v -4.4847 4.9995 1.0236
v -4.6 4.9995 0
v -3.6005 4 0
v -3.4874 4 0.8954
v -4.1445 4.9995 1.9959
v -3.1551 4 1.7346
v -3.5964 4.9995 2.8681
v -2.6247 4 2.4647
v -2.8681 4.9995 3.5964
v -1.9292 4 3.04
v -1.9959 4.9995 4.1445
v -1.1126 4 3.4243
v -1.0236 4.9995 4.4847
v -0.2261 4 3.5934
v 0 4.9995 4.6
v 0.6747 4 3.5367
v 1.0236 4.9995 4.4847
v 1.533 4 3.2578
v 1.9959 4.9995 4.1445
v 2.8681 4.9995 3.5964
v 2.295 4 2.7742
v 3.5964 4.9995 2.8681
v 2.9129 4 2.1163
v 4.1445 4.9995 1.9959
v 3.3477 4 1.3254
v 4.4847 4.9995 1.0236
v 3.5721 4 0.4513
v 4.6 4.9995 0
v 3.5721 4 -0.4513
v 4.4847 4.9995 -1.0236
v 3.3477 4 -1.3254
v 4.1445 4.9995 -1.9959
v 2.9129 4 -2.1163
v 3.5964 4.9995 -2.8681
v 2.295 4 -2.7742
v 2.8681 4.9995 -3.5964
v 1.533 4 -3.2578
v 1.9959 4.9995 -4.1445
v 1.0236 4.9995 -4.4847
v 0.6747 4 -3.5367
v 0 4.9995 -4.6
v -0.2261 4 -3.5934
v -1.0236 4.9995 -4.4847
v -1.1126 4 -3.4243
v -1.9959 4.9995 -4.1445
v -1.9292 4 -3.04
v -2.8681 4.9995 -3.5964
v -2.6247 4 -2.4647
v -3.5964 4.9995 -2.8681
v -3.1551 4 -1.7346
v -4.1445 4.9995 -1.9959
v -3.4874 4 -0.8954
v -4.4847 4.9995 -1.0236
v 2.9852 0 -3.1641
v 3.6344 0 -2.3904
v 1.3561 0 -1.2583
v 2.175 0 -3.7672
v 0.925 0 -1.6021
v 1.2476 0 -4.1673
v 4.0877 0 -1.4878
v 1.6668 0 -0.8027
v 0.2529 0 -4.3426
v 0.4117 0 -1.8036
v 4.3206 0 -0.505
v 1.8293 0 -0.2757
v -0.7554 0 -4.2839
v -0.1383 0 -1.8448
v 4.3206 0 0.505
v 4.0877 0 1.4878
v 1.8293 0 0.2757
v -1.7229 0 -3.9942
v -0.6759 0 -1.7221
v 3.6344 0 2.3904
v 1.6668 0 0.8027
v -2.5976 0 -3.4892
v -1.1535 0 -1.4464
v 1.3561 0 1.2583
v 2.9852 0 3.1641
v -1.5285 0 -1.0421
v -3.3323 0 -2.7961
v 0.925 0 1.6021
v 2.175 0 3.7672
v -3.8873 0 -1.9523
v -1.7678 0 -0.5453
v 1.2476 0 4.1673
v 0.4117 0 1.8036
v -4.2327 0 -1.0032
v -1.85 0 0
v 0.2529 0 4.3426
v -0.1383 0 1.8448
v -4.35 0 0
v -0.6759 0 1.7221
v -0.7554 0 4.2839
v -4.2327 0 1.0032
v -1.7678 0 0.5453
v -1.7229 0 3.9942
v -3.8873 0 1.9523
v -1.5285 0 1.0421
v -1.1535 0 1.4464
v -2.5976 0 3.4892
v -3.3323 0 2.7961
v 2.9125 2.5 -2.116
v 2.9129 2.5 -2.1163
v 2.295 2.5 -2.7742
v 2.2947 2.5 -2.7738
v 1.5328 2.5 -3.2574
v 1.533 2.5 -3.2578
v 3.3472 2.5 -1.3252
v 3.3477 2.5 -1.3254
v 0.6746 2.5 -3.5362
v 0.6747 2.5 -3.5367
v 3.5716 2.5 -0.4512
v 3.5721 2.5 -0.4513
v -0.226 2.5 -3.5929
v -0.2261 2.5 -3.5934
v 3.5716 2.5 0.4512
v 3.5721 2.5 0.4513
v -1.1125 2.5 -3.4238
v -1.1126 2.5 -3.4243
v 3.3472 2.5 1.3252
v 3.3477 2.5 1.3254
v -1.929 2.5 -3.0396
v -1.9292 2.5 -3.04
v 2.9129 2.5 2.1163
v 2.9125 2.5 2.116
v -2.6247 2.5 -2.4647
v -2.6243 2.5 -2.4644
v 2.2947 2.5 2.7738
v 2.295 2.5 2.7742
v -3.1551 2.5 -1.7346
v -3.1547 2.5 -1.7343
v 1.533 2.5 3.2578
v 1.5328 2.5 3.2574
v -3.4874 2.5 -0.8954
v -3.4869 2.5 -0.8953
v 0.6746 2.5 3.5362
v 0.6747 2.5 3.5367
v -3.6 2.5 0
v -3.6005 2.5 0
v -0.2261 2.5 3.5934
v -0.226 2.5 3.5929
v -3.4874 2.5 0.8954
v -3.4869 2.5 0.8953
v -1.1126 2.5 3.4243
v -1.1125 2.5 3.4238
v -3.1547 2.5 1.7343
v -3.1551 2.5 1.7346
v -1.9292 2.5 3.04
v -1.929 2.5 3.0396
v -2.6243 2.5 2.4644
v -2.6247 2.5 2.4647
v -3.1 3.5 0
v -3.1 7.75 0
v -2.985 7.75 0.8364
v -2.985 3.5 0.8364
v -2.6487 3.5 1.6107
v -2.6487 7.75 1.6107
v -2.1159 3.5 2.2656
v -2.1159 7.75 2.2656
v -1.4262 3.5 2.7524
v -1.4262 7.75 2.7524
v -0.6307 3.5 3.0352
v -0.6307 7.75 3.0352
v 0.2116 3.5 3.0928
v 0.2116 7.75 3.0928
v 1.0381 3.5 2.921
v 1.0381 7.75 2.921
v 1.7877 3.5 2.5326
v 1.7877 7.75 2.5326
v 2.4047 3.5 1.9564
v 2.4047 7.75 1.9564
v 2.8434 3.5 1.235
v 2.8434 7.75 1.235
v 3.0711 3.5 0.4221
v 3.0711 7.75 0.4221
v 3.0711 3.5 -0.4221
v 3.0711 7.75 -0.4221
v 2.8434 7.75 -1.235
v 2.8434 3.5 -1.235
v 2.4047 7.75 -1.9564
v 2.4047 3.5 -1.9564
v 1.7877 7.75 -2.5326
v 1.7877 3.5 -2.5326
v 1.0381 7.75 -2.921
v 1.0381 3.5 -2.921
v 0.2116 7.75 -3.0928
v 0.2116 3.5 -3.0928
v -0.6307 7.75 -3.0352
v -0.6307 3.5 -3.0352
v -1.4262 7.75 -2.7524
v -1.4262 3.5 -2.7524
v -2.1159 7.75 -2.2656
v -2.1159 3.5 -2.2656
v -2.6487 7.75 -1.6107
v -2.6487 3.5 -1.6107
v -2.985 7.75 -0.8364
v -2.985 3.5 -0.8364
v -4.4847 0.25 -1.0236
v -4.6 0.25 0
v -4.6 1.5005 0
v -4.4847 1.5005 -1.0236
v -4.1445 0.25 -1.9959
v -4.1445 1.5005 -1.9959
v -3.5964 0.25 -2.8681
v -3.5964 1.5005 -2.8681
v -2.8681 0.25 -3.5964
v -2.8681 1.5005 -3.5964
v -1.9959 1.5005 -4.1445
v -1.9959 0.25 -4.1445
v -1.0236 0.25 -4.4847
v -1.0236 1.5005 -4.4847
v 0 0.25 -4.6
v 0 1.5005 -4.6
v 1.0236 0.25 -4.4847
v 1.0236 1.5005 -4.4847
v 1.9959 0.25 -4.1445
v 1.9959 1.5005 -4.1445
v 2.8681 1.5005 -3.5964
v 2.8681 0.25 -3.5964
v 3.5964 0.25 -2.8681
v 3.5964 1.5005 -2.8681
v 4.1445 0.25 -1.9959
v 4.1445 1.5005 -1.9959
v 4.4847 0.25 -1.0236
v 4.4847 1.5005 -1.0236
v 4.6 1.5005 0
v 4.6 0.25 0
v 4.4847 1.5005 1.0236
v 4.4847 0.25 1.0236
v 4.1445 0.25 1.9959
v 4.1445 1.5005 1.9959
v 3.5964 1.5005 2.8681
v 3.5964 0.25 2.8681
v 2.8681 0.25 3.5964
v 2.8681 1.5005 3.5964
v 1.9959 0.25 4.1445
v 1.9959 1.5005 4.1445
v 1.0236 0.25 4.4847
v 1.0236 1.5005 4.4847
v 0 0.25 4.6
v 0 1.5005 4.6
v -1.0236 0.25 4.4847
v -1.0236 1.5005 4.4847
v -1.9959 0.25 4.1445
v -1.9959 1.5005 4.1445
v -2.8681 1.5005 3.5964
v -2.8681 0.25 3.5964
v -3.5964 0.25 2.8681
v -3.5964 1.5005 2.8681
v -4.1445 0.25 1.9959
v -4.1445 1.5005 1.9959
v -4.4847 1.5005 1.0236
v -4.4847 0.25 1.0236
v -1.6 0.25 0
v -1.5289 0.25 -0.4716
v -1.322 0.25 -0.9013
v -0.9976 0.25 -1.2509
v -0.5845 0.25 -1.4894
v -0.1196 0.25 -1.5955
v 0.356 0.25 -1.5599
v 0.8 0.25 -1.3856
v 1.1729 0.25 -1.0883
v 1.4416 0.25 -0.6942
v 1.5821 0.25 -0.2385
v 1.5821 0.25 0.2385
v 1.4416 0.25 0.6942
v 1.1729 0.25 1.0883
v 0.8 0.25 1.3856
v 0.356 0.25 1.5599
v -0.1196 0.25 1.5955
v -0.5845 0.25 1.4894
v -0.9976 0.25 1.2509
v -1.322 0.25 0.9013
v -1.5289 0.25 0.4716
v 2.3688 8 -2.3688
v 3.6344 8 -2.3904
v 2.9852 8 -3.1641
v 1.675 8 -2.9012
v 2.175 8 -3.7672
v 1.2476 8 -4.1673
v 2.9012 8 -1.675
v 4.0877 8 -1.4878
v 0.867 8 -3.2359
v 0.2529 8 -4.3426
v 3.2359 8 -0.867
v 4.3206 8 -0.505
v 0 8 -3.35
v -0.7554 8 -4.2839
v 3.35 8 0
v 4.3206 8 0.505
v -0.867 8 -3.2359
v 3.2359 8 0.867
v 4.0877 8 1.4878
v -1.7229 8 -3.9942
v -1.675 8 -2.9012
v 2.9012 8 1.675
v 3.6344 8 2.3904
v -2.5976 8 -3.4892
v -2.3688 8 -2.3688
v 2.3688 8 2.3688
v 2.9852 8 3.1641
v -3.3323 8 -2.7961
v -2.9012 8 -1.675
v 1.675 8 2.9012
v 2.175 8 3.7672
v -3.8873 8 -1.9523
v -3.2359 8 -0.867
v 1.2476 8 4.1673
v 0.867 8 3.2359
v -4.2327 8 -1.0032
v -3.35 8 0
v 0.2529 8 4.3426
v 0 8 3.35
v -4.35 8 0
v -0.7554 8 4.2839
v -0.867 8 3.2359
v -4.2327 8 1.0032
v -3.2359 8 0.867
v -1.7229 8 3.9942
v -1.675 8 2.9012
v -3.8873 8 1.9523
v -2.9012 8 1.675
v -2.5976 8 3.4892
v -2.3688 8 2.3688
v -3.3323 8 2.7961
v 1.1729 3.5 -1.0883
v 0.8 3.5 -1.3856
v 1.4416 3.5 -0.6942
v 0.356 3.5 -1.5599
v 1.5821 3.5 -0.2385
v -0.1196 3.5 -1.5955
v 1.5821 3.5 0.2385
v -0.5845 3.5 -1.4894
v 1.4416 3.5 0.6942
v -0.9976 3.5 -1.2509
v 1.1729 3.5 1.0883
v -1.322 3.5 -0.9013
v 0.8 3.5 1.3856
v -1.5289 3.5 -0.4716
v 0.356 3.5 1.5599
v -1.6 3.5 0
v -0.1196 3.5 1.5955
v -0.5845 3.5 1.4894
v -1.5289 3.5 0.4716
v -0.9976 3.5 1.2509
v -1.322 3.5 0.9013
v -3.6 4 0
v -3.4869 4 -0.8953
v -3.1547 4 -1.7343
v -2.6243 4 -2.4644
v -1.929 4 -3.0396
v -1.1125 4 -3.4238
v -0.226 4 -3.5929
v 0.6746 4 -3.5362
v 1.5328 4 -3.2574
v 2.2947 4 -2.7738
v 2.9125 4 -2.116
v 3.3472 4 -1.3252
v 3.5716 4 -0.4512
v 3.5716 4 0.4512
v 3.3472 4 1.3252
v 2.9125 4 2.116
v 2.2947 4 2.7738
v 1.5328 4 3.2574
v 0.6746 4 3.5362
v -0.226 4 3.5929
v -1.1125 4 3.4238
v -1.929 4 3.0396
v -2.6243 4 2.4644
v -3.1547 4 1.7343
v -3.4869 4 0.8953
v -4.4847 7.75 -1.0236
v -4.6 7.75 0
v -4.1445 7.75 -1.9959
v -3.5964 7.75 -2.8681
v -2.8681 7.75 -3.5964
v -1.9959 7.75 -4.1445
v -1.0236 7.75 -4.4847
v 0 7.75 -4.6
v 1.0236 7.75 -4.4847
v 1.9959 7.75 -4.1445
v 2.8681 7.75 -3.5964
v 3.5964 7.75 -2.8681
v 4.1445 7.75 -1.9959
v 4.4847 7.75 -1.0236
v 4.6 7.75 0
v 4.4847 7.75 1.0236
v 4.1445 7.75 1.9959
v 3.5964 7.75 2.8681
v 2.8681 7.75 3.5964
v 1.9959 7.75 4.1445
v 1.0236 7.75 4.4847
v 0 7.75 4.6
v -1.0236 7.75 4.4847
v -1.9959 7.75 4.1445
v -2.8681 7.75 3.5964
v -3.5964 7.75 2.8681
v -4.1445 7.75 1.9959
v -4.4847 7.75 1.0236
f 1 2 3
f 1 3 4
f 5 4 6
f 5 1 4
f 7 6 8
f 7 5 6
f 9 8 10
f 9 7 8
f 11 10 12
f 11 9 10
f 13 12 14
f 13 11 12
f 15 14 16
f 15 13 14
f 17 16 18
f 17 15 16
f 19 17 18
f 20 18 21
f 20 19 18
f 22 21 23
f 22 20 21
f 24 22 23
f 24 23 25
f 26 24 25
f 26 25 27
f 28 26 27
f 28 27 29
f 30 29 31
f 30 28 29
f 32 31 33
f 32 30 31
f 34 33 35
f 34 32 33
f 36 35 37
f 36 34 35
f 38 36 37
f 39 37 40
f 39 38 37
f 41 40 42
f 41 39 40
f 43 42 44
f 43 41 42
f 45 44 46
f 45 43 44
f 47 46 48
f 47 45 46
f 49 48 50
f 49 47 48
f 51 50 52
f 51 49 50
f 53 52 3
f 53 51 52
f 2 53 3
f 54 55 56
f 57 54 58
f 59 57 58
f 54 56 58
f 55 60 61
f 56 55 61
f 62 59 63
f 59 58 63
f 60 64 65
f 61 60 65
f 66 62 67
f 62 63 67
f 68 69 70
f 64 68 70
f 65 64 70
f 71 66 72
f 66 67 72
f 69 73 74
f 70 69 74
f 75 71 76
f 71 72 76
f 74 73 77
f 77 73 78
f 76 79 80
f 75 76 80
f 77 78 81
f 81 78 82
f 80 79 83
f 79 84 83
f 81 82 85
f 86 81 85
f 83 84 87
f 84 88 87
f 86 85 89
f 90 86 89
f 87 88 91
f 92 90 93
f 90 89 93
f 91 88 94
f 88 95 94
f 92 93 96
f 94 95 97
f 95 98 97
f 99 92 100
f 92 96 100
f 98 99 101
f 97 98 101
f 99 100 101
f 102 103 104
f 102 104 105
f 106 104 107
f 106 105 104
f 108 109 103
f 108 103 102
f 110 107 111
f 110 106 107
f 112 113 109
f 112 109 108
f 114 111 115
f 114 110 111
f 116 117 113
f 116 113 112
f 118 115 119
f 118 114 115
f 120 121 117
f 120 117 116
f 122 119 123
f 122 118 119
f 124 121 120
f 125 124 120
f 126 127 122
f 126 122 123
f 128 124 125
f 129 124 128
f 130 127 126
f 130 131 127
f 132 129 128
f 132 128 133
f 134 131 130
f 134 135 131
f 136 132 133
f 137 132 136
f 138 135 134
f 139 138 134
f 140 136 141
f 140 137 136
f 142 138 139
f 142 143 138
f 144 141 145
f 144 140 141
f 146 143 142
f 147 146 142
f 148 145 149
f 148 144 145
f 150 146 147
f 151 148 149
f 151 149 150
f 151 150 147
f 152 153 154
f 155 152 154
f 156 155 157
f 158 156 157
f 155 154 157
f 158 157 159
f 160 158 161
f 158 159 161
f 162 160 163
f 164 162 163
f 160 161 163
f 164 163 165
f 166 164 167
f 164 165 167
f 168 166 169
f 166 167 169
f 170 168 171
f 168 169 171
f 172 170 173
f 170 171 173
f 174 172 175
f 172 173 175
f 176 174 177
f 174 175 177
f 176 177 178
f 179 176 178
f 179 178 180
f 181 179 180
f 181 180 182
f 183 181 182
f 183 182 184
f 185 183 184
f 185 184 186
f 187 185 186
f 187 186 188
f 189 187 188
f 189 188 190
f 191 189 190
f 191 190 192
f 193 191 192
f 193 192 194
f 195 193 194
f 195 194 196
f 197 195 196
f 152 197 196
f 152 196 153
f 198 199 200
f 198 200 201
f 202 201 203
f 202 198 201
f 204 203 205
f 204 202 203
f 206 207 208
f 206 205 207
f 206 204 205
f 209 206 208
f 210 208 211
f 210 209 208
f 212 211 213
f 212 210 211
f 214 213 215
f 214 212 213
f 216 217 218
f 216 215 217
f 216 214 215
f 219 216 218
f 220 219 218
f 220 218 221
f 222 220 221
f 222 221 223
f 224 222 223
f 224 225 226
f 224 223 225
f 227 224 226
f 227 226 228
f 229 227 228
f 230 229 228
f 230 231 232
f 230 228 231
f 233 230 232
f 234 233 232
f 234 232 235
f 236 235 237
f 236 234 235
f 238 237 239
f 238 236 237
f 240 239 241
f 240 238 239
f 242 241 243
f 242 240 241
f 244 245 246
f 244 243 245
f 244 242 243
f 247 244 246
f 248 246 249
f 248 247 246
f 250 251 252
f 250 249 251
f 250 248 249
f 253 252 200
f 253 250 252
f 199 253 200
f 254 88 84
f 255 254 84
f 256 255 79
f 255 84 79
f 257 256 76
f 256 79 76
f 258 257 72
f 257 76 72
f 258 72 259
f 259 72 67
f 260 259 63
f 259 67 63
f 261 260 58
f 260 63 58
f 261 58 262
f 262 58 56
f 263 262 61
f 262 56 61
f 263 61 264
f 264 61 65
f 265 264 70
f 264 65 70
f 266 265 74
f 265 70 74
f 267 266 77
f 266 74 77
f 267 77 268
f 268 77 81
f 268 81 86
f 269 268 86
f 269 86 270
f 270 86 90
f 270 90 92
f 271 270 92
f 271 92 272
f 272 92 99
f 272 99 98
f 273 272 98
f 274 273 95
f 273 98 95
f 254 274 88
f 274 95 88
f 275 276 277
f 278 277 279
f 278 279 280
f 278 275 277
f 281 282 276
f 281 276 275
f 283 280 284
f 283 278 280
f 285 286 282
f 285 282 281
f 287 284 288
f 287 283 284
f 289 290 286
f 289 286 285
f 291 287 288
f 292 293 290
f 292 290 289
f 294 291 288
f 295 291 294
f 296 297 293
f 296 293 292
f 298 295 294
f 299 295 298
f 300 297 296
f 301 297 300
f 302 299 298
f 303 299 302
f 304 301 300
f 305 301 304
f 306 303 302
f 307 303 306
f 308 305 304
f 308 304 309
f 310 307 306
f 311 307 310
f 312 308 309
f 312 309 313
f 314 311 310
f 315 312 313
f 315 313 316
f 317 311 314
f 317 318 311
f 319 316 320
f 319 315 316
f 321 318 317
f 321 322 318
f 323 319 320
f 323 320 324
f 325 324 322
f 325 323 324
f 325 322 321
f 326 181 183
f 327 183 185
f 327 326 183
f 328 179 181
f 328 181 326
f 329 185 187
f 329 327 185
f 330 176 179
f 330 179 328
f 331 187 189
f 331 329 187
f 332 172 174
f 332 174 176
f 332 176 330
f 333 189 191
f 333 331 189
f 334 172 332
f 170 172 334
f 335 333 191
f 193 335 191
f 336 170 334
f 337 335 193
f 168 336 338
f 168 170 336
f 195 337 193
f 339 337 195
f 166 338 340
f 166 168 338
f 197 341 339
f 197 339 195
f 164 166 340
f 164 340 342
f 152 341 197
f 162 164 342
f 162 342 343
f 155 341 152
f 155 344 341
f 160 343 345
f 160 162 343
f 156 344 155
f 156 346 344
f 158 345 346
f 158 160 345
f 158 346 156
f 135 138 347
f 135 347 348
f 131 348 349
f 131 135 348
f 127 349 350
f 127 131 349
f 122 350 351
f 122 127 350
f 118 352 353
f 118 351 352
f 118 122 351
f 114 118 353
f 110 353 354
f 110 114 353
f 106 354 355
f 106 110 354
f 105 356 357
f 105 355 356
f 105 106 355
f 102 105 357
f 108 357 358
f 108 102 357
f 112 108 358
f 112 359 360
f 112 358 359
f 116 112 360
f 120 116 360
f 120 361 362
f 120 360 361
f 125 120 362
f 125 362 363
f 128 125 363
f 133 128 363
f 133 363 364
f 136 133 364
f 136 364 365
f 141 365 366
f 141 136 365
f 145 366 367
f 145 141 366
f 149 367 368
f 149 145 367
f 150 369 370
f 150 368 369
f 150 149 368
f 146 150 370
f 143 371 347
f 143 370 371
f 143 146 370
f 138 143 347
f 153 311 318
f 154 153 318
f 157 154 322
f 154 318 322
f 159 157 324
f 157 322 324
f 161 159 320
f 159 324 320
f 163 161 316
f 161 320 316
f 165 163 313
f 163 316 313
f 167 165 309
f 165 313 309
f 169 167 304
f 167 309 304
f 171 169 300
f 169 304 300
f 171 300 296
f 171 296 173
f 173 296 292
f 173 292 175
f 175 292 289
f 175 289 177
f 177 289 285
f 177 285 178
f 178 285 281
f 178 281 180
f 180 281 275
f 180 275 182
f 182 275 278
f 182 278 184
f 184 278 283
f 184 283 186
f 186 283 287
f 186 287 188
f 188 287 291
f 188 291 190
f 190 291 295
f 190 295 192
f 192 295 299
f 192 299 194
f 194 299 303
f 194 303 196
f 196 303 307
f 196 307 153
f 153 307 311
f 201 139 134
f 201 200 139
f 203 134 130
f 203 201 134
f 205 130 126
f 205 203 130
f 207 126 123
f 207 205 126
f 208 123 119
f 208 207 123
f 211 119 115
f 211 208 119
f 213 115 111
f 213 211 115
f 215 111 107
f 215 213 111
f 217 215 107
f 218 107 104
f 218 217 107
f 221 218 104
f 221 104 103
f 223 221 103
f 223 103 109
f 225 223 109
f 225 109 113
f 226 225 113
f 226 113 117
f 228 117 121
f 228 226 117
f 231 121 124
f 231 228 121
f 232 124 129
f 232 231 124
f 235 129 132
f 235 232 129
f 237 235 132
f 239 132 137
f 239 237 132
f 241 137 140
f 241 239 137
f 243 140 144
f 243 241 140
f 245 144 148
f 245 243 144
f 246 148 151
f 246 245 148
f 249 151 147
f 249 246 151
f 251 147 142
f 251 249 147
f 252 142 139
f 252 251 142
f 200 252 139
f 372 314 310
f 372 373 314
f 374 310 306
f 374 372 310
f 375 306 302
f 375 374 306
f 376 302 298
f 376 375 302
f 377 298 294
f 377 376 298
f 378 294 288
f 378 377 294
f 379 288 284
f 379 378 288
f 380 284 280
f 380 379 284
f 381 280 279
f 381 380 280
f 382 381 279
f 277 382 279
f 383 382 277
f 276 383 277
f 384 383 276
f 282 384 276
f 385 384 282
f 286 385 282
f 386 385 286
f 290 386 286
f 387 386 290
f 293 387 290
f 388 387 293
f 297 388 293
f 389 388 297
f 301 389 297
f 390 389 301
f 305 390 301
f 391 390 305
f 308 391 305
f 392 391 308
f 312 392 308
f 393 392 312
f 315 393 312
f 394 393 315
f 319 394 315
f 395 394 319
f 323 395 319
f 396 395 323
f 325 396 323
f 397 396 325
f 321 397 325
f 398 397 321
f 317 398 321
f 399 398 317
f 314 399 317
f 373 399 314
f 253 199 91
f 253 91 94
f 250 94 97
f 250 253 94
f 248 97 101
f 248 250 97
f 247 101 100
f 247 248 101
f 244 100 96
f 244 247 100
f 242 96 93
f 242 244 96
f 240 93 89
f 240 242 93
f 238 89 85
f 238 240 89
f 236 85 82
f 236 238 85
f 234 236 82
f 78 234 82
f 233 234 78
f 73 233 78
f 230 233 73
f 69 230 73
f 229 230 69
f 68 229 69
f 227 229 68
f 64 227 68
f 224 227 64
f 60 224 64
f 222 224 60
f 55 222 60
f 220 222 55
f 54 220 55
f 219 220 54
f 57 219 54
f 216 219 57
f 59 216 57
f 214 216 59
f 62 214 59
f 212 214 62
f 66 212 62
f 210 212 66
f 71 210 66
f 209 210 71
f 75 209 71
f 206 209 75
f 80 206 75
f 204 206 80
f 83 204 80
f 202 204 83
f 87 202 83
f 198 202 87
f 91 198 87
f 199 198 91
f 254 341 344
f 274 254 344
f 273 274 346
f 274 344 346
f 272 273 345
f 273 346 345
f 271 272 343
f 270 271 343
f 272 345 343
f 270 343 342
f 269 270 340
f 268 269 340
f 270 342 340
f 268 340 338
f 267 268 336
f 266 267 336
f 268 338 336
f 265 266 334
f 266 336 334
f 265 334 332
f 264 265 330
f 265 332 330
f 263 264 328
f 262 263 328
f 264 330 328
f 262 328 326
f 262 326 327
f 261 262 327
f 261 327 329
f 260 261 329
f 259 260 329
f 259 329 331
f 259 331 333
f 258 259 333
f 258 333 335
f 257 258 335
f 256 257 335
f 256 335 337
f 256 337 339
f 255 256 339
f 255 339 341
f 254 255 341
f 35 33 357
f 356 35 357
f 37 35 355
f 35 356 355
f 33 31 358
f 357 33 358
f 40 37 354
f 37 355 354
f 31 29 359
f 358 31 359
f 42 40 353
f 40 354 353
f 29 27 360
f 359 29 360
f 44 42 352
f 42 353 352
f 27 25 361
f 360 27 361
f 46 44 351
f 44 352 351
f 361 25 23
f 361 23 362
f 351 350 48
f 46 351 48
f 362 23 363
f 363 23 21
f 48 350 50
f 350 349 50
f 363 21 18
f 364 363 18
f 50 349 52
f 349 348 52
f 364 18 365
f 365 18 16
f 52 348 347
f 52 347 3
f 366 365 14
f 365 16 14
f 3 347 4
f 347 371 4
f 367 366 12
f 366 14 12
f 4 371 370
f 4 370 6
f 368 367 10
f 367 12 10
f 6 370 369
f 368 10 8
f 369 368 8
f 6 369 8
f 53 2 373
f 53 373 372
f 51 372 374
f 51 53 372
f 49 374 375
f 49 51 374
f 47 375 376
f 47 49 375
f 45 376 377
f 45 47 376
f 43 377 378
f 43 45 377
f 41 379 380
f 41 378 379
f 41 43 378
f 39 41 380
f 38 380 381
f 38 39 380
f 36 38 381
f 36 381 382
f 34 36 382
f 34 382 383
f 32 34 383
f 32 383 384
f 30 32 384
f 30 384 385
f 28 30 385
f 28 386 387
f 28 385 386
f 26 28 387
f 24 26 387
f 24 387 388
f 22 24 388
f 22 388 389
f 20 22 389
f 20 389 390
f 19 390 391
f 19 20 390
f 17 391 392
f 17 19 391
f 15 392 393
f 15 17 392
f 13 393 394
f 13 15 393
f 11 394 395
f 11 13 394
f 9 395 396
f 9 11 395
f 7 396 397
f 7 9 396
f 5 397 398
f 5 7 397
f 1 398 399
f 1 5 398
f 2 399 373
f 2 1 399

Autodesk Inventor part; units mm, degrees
ref_plane "YZ Plane" through (0, 0, 0) normal (1, 0, 0) x (0, 1, 0)
ref_plane "XZ Plane" through (0, 0, 0) normal (0, 1, 0) x (-1, 0, 0)
ref_plane "XY Plane" through (0, 0, 0) normal (0, 0, 1) x (1, 0, 0)
sketch "Sketch1" plane through (0, 0, 0) normal (0, 0, 1) x (1, 0, 0)
  line L0 (0, 0) -> (-1.6, 0) construction
  line L1 (0, 0) -> (0, 8)
  line L2 (-1.6, 0) -> (-4.6, 0)
  line L3 (-1.6, 0) -> (-1.6, 3.5)
  line L4 (-1.6, 3.5) -> (-3.1, 3.5)
  line L5 (-3.1, 3.5) -> (-3.1, 8)
  line L6 (-3.1, 8) -> (-4.6, 8)
  line L7 (-4.6, 8) -> (-4.6, 4)
  line L8 (-4.6, 4) -> (-3.6, 4)
  line L9 (-3.6, 4) -> (-3.6, 2.5)
  line L10 (-3.6, 2.5) -> (-4.6, 2.5)
  line L11 (-4.6, 2.5) -> (-4.6, 0)
  dimension "d0" = 1.6
  dimension "d1" = 8
  dimension "d2" = 3
  dimension "d3" = 3.5
  dimension "d4" = 1.5
  dimension "d5" = 4
  dimension "d6" = 1
  dimension "d7" = 1.5
revolve "Revolution1" add sketch "Sketch1" angle 360 about axis through (0, 0, 0) along (0, 1, 0)
chamfer "Chamfer1" distance 1 angle 45 2 edges at (4.6, 2.5, 0) (4.6, 4, 0)
chamfer "Chamfer2" distance 0.25 angle 45 4 edges at (4.6, 8, 0) (3.1, 8, 0) (4.6, 0, 0) (1.6, 0, 0)
properties part number "Z25_Side_Lock_Button" material "Aluminum 6061"
